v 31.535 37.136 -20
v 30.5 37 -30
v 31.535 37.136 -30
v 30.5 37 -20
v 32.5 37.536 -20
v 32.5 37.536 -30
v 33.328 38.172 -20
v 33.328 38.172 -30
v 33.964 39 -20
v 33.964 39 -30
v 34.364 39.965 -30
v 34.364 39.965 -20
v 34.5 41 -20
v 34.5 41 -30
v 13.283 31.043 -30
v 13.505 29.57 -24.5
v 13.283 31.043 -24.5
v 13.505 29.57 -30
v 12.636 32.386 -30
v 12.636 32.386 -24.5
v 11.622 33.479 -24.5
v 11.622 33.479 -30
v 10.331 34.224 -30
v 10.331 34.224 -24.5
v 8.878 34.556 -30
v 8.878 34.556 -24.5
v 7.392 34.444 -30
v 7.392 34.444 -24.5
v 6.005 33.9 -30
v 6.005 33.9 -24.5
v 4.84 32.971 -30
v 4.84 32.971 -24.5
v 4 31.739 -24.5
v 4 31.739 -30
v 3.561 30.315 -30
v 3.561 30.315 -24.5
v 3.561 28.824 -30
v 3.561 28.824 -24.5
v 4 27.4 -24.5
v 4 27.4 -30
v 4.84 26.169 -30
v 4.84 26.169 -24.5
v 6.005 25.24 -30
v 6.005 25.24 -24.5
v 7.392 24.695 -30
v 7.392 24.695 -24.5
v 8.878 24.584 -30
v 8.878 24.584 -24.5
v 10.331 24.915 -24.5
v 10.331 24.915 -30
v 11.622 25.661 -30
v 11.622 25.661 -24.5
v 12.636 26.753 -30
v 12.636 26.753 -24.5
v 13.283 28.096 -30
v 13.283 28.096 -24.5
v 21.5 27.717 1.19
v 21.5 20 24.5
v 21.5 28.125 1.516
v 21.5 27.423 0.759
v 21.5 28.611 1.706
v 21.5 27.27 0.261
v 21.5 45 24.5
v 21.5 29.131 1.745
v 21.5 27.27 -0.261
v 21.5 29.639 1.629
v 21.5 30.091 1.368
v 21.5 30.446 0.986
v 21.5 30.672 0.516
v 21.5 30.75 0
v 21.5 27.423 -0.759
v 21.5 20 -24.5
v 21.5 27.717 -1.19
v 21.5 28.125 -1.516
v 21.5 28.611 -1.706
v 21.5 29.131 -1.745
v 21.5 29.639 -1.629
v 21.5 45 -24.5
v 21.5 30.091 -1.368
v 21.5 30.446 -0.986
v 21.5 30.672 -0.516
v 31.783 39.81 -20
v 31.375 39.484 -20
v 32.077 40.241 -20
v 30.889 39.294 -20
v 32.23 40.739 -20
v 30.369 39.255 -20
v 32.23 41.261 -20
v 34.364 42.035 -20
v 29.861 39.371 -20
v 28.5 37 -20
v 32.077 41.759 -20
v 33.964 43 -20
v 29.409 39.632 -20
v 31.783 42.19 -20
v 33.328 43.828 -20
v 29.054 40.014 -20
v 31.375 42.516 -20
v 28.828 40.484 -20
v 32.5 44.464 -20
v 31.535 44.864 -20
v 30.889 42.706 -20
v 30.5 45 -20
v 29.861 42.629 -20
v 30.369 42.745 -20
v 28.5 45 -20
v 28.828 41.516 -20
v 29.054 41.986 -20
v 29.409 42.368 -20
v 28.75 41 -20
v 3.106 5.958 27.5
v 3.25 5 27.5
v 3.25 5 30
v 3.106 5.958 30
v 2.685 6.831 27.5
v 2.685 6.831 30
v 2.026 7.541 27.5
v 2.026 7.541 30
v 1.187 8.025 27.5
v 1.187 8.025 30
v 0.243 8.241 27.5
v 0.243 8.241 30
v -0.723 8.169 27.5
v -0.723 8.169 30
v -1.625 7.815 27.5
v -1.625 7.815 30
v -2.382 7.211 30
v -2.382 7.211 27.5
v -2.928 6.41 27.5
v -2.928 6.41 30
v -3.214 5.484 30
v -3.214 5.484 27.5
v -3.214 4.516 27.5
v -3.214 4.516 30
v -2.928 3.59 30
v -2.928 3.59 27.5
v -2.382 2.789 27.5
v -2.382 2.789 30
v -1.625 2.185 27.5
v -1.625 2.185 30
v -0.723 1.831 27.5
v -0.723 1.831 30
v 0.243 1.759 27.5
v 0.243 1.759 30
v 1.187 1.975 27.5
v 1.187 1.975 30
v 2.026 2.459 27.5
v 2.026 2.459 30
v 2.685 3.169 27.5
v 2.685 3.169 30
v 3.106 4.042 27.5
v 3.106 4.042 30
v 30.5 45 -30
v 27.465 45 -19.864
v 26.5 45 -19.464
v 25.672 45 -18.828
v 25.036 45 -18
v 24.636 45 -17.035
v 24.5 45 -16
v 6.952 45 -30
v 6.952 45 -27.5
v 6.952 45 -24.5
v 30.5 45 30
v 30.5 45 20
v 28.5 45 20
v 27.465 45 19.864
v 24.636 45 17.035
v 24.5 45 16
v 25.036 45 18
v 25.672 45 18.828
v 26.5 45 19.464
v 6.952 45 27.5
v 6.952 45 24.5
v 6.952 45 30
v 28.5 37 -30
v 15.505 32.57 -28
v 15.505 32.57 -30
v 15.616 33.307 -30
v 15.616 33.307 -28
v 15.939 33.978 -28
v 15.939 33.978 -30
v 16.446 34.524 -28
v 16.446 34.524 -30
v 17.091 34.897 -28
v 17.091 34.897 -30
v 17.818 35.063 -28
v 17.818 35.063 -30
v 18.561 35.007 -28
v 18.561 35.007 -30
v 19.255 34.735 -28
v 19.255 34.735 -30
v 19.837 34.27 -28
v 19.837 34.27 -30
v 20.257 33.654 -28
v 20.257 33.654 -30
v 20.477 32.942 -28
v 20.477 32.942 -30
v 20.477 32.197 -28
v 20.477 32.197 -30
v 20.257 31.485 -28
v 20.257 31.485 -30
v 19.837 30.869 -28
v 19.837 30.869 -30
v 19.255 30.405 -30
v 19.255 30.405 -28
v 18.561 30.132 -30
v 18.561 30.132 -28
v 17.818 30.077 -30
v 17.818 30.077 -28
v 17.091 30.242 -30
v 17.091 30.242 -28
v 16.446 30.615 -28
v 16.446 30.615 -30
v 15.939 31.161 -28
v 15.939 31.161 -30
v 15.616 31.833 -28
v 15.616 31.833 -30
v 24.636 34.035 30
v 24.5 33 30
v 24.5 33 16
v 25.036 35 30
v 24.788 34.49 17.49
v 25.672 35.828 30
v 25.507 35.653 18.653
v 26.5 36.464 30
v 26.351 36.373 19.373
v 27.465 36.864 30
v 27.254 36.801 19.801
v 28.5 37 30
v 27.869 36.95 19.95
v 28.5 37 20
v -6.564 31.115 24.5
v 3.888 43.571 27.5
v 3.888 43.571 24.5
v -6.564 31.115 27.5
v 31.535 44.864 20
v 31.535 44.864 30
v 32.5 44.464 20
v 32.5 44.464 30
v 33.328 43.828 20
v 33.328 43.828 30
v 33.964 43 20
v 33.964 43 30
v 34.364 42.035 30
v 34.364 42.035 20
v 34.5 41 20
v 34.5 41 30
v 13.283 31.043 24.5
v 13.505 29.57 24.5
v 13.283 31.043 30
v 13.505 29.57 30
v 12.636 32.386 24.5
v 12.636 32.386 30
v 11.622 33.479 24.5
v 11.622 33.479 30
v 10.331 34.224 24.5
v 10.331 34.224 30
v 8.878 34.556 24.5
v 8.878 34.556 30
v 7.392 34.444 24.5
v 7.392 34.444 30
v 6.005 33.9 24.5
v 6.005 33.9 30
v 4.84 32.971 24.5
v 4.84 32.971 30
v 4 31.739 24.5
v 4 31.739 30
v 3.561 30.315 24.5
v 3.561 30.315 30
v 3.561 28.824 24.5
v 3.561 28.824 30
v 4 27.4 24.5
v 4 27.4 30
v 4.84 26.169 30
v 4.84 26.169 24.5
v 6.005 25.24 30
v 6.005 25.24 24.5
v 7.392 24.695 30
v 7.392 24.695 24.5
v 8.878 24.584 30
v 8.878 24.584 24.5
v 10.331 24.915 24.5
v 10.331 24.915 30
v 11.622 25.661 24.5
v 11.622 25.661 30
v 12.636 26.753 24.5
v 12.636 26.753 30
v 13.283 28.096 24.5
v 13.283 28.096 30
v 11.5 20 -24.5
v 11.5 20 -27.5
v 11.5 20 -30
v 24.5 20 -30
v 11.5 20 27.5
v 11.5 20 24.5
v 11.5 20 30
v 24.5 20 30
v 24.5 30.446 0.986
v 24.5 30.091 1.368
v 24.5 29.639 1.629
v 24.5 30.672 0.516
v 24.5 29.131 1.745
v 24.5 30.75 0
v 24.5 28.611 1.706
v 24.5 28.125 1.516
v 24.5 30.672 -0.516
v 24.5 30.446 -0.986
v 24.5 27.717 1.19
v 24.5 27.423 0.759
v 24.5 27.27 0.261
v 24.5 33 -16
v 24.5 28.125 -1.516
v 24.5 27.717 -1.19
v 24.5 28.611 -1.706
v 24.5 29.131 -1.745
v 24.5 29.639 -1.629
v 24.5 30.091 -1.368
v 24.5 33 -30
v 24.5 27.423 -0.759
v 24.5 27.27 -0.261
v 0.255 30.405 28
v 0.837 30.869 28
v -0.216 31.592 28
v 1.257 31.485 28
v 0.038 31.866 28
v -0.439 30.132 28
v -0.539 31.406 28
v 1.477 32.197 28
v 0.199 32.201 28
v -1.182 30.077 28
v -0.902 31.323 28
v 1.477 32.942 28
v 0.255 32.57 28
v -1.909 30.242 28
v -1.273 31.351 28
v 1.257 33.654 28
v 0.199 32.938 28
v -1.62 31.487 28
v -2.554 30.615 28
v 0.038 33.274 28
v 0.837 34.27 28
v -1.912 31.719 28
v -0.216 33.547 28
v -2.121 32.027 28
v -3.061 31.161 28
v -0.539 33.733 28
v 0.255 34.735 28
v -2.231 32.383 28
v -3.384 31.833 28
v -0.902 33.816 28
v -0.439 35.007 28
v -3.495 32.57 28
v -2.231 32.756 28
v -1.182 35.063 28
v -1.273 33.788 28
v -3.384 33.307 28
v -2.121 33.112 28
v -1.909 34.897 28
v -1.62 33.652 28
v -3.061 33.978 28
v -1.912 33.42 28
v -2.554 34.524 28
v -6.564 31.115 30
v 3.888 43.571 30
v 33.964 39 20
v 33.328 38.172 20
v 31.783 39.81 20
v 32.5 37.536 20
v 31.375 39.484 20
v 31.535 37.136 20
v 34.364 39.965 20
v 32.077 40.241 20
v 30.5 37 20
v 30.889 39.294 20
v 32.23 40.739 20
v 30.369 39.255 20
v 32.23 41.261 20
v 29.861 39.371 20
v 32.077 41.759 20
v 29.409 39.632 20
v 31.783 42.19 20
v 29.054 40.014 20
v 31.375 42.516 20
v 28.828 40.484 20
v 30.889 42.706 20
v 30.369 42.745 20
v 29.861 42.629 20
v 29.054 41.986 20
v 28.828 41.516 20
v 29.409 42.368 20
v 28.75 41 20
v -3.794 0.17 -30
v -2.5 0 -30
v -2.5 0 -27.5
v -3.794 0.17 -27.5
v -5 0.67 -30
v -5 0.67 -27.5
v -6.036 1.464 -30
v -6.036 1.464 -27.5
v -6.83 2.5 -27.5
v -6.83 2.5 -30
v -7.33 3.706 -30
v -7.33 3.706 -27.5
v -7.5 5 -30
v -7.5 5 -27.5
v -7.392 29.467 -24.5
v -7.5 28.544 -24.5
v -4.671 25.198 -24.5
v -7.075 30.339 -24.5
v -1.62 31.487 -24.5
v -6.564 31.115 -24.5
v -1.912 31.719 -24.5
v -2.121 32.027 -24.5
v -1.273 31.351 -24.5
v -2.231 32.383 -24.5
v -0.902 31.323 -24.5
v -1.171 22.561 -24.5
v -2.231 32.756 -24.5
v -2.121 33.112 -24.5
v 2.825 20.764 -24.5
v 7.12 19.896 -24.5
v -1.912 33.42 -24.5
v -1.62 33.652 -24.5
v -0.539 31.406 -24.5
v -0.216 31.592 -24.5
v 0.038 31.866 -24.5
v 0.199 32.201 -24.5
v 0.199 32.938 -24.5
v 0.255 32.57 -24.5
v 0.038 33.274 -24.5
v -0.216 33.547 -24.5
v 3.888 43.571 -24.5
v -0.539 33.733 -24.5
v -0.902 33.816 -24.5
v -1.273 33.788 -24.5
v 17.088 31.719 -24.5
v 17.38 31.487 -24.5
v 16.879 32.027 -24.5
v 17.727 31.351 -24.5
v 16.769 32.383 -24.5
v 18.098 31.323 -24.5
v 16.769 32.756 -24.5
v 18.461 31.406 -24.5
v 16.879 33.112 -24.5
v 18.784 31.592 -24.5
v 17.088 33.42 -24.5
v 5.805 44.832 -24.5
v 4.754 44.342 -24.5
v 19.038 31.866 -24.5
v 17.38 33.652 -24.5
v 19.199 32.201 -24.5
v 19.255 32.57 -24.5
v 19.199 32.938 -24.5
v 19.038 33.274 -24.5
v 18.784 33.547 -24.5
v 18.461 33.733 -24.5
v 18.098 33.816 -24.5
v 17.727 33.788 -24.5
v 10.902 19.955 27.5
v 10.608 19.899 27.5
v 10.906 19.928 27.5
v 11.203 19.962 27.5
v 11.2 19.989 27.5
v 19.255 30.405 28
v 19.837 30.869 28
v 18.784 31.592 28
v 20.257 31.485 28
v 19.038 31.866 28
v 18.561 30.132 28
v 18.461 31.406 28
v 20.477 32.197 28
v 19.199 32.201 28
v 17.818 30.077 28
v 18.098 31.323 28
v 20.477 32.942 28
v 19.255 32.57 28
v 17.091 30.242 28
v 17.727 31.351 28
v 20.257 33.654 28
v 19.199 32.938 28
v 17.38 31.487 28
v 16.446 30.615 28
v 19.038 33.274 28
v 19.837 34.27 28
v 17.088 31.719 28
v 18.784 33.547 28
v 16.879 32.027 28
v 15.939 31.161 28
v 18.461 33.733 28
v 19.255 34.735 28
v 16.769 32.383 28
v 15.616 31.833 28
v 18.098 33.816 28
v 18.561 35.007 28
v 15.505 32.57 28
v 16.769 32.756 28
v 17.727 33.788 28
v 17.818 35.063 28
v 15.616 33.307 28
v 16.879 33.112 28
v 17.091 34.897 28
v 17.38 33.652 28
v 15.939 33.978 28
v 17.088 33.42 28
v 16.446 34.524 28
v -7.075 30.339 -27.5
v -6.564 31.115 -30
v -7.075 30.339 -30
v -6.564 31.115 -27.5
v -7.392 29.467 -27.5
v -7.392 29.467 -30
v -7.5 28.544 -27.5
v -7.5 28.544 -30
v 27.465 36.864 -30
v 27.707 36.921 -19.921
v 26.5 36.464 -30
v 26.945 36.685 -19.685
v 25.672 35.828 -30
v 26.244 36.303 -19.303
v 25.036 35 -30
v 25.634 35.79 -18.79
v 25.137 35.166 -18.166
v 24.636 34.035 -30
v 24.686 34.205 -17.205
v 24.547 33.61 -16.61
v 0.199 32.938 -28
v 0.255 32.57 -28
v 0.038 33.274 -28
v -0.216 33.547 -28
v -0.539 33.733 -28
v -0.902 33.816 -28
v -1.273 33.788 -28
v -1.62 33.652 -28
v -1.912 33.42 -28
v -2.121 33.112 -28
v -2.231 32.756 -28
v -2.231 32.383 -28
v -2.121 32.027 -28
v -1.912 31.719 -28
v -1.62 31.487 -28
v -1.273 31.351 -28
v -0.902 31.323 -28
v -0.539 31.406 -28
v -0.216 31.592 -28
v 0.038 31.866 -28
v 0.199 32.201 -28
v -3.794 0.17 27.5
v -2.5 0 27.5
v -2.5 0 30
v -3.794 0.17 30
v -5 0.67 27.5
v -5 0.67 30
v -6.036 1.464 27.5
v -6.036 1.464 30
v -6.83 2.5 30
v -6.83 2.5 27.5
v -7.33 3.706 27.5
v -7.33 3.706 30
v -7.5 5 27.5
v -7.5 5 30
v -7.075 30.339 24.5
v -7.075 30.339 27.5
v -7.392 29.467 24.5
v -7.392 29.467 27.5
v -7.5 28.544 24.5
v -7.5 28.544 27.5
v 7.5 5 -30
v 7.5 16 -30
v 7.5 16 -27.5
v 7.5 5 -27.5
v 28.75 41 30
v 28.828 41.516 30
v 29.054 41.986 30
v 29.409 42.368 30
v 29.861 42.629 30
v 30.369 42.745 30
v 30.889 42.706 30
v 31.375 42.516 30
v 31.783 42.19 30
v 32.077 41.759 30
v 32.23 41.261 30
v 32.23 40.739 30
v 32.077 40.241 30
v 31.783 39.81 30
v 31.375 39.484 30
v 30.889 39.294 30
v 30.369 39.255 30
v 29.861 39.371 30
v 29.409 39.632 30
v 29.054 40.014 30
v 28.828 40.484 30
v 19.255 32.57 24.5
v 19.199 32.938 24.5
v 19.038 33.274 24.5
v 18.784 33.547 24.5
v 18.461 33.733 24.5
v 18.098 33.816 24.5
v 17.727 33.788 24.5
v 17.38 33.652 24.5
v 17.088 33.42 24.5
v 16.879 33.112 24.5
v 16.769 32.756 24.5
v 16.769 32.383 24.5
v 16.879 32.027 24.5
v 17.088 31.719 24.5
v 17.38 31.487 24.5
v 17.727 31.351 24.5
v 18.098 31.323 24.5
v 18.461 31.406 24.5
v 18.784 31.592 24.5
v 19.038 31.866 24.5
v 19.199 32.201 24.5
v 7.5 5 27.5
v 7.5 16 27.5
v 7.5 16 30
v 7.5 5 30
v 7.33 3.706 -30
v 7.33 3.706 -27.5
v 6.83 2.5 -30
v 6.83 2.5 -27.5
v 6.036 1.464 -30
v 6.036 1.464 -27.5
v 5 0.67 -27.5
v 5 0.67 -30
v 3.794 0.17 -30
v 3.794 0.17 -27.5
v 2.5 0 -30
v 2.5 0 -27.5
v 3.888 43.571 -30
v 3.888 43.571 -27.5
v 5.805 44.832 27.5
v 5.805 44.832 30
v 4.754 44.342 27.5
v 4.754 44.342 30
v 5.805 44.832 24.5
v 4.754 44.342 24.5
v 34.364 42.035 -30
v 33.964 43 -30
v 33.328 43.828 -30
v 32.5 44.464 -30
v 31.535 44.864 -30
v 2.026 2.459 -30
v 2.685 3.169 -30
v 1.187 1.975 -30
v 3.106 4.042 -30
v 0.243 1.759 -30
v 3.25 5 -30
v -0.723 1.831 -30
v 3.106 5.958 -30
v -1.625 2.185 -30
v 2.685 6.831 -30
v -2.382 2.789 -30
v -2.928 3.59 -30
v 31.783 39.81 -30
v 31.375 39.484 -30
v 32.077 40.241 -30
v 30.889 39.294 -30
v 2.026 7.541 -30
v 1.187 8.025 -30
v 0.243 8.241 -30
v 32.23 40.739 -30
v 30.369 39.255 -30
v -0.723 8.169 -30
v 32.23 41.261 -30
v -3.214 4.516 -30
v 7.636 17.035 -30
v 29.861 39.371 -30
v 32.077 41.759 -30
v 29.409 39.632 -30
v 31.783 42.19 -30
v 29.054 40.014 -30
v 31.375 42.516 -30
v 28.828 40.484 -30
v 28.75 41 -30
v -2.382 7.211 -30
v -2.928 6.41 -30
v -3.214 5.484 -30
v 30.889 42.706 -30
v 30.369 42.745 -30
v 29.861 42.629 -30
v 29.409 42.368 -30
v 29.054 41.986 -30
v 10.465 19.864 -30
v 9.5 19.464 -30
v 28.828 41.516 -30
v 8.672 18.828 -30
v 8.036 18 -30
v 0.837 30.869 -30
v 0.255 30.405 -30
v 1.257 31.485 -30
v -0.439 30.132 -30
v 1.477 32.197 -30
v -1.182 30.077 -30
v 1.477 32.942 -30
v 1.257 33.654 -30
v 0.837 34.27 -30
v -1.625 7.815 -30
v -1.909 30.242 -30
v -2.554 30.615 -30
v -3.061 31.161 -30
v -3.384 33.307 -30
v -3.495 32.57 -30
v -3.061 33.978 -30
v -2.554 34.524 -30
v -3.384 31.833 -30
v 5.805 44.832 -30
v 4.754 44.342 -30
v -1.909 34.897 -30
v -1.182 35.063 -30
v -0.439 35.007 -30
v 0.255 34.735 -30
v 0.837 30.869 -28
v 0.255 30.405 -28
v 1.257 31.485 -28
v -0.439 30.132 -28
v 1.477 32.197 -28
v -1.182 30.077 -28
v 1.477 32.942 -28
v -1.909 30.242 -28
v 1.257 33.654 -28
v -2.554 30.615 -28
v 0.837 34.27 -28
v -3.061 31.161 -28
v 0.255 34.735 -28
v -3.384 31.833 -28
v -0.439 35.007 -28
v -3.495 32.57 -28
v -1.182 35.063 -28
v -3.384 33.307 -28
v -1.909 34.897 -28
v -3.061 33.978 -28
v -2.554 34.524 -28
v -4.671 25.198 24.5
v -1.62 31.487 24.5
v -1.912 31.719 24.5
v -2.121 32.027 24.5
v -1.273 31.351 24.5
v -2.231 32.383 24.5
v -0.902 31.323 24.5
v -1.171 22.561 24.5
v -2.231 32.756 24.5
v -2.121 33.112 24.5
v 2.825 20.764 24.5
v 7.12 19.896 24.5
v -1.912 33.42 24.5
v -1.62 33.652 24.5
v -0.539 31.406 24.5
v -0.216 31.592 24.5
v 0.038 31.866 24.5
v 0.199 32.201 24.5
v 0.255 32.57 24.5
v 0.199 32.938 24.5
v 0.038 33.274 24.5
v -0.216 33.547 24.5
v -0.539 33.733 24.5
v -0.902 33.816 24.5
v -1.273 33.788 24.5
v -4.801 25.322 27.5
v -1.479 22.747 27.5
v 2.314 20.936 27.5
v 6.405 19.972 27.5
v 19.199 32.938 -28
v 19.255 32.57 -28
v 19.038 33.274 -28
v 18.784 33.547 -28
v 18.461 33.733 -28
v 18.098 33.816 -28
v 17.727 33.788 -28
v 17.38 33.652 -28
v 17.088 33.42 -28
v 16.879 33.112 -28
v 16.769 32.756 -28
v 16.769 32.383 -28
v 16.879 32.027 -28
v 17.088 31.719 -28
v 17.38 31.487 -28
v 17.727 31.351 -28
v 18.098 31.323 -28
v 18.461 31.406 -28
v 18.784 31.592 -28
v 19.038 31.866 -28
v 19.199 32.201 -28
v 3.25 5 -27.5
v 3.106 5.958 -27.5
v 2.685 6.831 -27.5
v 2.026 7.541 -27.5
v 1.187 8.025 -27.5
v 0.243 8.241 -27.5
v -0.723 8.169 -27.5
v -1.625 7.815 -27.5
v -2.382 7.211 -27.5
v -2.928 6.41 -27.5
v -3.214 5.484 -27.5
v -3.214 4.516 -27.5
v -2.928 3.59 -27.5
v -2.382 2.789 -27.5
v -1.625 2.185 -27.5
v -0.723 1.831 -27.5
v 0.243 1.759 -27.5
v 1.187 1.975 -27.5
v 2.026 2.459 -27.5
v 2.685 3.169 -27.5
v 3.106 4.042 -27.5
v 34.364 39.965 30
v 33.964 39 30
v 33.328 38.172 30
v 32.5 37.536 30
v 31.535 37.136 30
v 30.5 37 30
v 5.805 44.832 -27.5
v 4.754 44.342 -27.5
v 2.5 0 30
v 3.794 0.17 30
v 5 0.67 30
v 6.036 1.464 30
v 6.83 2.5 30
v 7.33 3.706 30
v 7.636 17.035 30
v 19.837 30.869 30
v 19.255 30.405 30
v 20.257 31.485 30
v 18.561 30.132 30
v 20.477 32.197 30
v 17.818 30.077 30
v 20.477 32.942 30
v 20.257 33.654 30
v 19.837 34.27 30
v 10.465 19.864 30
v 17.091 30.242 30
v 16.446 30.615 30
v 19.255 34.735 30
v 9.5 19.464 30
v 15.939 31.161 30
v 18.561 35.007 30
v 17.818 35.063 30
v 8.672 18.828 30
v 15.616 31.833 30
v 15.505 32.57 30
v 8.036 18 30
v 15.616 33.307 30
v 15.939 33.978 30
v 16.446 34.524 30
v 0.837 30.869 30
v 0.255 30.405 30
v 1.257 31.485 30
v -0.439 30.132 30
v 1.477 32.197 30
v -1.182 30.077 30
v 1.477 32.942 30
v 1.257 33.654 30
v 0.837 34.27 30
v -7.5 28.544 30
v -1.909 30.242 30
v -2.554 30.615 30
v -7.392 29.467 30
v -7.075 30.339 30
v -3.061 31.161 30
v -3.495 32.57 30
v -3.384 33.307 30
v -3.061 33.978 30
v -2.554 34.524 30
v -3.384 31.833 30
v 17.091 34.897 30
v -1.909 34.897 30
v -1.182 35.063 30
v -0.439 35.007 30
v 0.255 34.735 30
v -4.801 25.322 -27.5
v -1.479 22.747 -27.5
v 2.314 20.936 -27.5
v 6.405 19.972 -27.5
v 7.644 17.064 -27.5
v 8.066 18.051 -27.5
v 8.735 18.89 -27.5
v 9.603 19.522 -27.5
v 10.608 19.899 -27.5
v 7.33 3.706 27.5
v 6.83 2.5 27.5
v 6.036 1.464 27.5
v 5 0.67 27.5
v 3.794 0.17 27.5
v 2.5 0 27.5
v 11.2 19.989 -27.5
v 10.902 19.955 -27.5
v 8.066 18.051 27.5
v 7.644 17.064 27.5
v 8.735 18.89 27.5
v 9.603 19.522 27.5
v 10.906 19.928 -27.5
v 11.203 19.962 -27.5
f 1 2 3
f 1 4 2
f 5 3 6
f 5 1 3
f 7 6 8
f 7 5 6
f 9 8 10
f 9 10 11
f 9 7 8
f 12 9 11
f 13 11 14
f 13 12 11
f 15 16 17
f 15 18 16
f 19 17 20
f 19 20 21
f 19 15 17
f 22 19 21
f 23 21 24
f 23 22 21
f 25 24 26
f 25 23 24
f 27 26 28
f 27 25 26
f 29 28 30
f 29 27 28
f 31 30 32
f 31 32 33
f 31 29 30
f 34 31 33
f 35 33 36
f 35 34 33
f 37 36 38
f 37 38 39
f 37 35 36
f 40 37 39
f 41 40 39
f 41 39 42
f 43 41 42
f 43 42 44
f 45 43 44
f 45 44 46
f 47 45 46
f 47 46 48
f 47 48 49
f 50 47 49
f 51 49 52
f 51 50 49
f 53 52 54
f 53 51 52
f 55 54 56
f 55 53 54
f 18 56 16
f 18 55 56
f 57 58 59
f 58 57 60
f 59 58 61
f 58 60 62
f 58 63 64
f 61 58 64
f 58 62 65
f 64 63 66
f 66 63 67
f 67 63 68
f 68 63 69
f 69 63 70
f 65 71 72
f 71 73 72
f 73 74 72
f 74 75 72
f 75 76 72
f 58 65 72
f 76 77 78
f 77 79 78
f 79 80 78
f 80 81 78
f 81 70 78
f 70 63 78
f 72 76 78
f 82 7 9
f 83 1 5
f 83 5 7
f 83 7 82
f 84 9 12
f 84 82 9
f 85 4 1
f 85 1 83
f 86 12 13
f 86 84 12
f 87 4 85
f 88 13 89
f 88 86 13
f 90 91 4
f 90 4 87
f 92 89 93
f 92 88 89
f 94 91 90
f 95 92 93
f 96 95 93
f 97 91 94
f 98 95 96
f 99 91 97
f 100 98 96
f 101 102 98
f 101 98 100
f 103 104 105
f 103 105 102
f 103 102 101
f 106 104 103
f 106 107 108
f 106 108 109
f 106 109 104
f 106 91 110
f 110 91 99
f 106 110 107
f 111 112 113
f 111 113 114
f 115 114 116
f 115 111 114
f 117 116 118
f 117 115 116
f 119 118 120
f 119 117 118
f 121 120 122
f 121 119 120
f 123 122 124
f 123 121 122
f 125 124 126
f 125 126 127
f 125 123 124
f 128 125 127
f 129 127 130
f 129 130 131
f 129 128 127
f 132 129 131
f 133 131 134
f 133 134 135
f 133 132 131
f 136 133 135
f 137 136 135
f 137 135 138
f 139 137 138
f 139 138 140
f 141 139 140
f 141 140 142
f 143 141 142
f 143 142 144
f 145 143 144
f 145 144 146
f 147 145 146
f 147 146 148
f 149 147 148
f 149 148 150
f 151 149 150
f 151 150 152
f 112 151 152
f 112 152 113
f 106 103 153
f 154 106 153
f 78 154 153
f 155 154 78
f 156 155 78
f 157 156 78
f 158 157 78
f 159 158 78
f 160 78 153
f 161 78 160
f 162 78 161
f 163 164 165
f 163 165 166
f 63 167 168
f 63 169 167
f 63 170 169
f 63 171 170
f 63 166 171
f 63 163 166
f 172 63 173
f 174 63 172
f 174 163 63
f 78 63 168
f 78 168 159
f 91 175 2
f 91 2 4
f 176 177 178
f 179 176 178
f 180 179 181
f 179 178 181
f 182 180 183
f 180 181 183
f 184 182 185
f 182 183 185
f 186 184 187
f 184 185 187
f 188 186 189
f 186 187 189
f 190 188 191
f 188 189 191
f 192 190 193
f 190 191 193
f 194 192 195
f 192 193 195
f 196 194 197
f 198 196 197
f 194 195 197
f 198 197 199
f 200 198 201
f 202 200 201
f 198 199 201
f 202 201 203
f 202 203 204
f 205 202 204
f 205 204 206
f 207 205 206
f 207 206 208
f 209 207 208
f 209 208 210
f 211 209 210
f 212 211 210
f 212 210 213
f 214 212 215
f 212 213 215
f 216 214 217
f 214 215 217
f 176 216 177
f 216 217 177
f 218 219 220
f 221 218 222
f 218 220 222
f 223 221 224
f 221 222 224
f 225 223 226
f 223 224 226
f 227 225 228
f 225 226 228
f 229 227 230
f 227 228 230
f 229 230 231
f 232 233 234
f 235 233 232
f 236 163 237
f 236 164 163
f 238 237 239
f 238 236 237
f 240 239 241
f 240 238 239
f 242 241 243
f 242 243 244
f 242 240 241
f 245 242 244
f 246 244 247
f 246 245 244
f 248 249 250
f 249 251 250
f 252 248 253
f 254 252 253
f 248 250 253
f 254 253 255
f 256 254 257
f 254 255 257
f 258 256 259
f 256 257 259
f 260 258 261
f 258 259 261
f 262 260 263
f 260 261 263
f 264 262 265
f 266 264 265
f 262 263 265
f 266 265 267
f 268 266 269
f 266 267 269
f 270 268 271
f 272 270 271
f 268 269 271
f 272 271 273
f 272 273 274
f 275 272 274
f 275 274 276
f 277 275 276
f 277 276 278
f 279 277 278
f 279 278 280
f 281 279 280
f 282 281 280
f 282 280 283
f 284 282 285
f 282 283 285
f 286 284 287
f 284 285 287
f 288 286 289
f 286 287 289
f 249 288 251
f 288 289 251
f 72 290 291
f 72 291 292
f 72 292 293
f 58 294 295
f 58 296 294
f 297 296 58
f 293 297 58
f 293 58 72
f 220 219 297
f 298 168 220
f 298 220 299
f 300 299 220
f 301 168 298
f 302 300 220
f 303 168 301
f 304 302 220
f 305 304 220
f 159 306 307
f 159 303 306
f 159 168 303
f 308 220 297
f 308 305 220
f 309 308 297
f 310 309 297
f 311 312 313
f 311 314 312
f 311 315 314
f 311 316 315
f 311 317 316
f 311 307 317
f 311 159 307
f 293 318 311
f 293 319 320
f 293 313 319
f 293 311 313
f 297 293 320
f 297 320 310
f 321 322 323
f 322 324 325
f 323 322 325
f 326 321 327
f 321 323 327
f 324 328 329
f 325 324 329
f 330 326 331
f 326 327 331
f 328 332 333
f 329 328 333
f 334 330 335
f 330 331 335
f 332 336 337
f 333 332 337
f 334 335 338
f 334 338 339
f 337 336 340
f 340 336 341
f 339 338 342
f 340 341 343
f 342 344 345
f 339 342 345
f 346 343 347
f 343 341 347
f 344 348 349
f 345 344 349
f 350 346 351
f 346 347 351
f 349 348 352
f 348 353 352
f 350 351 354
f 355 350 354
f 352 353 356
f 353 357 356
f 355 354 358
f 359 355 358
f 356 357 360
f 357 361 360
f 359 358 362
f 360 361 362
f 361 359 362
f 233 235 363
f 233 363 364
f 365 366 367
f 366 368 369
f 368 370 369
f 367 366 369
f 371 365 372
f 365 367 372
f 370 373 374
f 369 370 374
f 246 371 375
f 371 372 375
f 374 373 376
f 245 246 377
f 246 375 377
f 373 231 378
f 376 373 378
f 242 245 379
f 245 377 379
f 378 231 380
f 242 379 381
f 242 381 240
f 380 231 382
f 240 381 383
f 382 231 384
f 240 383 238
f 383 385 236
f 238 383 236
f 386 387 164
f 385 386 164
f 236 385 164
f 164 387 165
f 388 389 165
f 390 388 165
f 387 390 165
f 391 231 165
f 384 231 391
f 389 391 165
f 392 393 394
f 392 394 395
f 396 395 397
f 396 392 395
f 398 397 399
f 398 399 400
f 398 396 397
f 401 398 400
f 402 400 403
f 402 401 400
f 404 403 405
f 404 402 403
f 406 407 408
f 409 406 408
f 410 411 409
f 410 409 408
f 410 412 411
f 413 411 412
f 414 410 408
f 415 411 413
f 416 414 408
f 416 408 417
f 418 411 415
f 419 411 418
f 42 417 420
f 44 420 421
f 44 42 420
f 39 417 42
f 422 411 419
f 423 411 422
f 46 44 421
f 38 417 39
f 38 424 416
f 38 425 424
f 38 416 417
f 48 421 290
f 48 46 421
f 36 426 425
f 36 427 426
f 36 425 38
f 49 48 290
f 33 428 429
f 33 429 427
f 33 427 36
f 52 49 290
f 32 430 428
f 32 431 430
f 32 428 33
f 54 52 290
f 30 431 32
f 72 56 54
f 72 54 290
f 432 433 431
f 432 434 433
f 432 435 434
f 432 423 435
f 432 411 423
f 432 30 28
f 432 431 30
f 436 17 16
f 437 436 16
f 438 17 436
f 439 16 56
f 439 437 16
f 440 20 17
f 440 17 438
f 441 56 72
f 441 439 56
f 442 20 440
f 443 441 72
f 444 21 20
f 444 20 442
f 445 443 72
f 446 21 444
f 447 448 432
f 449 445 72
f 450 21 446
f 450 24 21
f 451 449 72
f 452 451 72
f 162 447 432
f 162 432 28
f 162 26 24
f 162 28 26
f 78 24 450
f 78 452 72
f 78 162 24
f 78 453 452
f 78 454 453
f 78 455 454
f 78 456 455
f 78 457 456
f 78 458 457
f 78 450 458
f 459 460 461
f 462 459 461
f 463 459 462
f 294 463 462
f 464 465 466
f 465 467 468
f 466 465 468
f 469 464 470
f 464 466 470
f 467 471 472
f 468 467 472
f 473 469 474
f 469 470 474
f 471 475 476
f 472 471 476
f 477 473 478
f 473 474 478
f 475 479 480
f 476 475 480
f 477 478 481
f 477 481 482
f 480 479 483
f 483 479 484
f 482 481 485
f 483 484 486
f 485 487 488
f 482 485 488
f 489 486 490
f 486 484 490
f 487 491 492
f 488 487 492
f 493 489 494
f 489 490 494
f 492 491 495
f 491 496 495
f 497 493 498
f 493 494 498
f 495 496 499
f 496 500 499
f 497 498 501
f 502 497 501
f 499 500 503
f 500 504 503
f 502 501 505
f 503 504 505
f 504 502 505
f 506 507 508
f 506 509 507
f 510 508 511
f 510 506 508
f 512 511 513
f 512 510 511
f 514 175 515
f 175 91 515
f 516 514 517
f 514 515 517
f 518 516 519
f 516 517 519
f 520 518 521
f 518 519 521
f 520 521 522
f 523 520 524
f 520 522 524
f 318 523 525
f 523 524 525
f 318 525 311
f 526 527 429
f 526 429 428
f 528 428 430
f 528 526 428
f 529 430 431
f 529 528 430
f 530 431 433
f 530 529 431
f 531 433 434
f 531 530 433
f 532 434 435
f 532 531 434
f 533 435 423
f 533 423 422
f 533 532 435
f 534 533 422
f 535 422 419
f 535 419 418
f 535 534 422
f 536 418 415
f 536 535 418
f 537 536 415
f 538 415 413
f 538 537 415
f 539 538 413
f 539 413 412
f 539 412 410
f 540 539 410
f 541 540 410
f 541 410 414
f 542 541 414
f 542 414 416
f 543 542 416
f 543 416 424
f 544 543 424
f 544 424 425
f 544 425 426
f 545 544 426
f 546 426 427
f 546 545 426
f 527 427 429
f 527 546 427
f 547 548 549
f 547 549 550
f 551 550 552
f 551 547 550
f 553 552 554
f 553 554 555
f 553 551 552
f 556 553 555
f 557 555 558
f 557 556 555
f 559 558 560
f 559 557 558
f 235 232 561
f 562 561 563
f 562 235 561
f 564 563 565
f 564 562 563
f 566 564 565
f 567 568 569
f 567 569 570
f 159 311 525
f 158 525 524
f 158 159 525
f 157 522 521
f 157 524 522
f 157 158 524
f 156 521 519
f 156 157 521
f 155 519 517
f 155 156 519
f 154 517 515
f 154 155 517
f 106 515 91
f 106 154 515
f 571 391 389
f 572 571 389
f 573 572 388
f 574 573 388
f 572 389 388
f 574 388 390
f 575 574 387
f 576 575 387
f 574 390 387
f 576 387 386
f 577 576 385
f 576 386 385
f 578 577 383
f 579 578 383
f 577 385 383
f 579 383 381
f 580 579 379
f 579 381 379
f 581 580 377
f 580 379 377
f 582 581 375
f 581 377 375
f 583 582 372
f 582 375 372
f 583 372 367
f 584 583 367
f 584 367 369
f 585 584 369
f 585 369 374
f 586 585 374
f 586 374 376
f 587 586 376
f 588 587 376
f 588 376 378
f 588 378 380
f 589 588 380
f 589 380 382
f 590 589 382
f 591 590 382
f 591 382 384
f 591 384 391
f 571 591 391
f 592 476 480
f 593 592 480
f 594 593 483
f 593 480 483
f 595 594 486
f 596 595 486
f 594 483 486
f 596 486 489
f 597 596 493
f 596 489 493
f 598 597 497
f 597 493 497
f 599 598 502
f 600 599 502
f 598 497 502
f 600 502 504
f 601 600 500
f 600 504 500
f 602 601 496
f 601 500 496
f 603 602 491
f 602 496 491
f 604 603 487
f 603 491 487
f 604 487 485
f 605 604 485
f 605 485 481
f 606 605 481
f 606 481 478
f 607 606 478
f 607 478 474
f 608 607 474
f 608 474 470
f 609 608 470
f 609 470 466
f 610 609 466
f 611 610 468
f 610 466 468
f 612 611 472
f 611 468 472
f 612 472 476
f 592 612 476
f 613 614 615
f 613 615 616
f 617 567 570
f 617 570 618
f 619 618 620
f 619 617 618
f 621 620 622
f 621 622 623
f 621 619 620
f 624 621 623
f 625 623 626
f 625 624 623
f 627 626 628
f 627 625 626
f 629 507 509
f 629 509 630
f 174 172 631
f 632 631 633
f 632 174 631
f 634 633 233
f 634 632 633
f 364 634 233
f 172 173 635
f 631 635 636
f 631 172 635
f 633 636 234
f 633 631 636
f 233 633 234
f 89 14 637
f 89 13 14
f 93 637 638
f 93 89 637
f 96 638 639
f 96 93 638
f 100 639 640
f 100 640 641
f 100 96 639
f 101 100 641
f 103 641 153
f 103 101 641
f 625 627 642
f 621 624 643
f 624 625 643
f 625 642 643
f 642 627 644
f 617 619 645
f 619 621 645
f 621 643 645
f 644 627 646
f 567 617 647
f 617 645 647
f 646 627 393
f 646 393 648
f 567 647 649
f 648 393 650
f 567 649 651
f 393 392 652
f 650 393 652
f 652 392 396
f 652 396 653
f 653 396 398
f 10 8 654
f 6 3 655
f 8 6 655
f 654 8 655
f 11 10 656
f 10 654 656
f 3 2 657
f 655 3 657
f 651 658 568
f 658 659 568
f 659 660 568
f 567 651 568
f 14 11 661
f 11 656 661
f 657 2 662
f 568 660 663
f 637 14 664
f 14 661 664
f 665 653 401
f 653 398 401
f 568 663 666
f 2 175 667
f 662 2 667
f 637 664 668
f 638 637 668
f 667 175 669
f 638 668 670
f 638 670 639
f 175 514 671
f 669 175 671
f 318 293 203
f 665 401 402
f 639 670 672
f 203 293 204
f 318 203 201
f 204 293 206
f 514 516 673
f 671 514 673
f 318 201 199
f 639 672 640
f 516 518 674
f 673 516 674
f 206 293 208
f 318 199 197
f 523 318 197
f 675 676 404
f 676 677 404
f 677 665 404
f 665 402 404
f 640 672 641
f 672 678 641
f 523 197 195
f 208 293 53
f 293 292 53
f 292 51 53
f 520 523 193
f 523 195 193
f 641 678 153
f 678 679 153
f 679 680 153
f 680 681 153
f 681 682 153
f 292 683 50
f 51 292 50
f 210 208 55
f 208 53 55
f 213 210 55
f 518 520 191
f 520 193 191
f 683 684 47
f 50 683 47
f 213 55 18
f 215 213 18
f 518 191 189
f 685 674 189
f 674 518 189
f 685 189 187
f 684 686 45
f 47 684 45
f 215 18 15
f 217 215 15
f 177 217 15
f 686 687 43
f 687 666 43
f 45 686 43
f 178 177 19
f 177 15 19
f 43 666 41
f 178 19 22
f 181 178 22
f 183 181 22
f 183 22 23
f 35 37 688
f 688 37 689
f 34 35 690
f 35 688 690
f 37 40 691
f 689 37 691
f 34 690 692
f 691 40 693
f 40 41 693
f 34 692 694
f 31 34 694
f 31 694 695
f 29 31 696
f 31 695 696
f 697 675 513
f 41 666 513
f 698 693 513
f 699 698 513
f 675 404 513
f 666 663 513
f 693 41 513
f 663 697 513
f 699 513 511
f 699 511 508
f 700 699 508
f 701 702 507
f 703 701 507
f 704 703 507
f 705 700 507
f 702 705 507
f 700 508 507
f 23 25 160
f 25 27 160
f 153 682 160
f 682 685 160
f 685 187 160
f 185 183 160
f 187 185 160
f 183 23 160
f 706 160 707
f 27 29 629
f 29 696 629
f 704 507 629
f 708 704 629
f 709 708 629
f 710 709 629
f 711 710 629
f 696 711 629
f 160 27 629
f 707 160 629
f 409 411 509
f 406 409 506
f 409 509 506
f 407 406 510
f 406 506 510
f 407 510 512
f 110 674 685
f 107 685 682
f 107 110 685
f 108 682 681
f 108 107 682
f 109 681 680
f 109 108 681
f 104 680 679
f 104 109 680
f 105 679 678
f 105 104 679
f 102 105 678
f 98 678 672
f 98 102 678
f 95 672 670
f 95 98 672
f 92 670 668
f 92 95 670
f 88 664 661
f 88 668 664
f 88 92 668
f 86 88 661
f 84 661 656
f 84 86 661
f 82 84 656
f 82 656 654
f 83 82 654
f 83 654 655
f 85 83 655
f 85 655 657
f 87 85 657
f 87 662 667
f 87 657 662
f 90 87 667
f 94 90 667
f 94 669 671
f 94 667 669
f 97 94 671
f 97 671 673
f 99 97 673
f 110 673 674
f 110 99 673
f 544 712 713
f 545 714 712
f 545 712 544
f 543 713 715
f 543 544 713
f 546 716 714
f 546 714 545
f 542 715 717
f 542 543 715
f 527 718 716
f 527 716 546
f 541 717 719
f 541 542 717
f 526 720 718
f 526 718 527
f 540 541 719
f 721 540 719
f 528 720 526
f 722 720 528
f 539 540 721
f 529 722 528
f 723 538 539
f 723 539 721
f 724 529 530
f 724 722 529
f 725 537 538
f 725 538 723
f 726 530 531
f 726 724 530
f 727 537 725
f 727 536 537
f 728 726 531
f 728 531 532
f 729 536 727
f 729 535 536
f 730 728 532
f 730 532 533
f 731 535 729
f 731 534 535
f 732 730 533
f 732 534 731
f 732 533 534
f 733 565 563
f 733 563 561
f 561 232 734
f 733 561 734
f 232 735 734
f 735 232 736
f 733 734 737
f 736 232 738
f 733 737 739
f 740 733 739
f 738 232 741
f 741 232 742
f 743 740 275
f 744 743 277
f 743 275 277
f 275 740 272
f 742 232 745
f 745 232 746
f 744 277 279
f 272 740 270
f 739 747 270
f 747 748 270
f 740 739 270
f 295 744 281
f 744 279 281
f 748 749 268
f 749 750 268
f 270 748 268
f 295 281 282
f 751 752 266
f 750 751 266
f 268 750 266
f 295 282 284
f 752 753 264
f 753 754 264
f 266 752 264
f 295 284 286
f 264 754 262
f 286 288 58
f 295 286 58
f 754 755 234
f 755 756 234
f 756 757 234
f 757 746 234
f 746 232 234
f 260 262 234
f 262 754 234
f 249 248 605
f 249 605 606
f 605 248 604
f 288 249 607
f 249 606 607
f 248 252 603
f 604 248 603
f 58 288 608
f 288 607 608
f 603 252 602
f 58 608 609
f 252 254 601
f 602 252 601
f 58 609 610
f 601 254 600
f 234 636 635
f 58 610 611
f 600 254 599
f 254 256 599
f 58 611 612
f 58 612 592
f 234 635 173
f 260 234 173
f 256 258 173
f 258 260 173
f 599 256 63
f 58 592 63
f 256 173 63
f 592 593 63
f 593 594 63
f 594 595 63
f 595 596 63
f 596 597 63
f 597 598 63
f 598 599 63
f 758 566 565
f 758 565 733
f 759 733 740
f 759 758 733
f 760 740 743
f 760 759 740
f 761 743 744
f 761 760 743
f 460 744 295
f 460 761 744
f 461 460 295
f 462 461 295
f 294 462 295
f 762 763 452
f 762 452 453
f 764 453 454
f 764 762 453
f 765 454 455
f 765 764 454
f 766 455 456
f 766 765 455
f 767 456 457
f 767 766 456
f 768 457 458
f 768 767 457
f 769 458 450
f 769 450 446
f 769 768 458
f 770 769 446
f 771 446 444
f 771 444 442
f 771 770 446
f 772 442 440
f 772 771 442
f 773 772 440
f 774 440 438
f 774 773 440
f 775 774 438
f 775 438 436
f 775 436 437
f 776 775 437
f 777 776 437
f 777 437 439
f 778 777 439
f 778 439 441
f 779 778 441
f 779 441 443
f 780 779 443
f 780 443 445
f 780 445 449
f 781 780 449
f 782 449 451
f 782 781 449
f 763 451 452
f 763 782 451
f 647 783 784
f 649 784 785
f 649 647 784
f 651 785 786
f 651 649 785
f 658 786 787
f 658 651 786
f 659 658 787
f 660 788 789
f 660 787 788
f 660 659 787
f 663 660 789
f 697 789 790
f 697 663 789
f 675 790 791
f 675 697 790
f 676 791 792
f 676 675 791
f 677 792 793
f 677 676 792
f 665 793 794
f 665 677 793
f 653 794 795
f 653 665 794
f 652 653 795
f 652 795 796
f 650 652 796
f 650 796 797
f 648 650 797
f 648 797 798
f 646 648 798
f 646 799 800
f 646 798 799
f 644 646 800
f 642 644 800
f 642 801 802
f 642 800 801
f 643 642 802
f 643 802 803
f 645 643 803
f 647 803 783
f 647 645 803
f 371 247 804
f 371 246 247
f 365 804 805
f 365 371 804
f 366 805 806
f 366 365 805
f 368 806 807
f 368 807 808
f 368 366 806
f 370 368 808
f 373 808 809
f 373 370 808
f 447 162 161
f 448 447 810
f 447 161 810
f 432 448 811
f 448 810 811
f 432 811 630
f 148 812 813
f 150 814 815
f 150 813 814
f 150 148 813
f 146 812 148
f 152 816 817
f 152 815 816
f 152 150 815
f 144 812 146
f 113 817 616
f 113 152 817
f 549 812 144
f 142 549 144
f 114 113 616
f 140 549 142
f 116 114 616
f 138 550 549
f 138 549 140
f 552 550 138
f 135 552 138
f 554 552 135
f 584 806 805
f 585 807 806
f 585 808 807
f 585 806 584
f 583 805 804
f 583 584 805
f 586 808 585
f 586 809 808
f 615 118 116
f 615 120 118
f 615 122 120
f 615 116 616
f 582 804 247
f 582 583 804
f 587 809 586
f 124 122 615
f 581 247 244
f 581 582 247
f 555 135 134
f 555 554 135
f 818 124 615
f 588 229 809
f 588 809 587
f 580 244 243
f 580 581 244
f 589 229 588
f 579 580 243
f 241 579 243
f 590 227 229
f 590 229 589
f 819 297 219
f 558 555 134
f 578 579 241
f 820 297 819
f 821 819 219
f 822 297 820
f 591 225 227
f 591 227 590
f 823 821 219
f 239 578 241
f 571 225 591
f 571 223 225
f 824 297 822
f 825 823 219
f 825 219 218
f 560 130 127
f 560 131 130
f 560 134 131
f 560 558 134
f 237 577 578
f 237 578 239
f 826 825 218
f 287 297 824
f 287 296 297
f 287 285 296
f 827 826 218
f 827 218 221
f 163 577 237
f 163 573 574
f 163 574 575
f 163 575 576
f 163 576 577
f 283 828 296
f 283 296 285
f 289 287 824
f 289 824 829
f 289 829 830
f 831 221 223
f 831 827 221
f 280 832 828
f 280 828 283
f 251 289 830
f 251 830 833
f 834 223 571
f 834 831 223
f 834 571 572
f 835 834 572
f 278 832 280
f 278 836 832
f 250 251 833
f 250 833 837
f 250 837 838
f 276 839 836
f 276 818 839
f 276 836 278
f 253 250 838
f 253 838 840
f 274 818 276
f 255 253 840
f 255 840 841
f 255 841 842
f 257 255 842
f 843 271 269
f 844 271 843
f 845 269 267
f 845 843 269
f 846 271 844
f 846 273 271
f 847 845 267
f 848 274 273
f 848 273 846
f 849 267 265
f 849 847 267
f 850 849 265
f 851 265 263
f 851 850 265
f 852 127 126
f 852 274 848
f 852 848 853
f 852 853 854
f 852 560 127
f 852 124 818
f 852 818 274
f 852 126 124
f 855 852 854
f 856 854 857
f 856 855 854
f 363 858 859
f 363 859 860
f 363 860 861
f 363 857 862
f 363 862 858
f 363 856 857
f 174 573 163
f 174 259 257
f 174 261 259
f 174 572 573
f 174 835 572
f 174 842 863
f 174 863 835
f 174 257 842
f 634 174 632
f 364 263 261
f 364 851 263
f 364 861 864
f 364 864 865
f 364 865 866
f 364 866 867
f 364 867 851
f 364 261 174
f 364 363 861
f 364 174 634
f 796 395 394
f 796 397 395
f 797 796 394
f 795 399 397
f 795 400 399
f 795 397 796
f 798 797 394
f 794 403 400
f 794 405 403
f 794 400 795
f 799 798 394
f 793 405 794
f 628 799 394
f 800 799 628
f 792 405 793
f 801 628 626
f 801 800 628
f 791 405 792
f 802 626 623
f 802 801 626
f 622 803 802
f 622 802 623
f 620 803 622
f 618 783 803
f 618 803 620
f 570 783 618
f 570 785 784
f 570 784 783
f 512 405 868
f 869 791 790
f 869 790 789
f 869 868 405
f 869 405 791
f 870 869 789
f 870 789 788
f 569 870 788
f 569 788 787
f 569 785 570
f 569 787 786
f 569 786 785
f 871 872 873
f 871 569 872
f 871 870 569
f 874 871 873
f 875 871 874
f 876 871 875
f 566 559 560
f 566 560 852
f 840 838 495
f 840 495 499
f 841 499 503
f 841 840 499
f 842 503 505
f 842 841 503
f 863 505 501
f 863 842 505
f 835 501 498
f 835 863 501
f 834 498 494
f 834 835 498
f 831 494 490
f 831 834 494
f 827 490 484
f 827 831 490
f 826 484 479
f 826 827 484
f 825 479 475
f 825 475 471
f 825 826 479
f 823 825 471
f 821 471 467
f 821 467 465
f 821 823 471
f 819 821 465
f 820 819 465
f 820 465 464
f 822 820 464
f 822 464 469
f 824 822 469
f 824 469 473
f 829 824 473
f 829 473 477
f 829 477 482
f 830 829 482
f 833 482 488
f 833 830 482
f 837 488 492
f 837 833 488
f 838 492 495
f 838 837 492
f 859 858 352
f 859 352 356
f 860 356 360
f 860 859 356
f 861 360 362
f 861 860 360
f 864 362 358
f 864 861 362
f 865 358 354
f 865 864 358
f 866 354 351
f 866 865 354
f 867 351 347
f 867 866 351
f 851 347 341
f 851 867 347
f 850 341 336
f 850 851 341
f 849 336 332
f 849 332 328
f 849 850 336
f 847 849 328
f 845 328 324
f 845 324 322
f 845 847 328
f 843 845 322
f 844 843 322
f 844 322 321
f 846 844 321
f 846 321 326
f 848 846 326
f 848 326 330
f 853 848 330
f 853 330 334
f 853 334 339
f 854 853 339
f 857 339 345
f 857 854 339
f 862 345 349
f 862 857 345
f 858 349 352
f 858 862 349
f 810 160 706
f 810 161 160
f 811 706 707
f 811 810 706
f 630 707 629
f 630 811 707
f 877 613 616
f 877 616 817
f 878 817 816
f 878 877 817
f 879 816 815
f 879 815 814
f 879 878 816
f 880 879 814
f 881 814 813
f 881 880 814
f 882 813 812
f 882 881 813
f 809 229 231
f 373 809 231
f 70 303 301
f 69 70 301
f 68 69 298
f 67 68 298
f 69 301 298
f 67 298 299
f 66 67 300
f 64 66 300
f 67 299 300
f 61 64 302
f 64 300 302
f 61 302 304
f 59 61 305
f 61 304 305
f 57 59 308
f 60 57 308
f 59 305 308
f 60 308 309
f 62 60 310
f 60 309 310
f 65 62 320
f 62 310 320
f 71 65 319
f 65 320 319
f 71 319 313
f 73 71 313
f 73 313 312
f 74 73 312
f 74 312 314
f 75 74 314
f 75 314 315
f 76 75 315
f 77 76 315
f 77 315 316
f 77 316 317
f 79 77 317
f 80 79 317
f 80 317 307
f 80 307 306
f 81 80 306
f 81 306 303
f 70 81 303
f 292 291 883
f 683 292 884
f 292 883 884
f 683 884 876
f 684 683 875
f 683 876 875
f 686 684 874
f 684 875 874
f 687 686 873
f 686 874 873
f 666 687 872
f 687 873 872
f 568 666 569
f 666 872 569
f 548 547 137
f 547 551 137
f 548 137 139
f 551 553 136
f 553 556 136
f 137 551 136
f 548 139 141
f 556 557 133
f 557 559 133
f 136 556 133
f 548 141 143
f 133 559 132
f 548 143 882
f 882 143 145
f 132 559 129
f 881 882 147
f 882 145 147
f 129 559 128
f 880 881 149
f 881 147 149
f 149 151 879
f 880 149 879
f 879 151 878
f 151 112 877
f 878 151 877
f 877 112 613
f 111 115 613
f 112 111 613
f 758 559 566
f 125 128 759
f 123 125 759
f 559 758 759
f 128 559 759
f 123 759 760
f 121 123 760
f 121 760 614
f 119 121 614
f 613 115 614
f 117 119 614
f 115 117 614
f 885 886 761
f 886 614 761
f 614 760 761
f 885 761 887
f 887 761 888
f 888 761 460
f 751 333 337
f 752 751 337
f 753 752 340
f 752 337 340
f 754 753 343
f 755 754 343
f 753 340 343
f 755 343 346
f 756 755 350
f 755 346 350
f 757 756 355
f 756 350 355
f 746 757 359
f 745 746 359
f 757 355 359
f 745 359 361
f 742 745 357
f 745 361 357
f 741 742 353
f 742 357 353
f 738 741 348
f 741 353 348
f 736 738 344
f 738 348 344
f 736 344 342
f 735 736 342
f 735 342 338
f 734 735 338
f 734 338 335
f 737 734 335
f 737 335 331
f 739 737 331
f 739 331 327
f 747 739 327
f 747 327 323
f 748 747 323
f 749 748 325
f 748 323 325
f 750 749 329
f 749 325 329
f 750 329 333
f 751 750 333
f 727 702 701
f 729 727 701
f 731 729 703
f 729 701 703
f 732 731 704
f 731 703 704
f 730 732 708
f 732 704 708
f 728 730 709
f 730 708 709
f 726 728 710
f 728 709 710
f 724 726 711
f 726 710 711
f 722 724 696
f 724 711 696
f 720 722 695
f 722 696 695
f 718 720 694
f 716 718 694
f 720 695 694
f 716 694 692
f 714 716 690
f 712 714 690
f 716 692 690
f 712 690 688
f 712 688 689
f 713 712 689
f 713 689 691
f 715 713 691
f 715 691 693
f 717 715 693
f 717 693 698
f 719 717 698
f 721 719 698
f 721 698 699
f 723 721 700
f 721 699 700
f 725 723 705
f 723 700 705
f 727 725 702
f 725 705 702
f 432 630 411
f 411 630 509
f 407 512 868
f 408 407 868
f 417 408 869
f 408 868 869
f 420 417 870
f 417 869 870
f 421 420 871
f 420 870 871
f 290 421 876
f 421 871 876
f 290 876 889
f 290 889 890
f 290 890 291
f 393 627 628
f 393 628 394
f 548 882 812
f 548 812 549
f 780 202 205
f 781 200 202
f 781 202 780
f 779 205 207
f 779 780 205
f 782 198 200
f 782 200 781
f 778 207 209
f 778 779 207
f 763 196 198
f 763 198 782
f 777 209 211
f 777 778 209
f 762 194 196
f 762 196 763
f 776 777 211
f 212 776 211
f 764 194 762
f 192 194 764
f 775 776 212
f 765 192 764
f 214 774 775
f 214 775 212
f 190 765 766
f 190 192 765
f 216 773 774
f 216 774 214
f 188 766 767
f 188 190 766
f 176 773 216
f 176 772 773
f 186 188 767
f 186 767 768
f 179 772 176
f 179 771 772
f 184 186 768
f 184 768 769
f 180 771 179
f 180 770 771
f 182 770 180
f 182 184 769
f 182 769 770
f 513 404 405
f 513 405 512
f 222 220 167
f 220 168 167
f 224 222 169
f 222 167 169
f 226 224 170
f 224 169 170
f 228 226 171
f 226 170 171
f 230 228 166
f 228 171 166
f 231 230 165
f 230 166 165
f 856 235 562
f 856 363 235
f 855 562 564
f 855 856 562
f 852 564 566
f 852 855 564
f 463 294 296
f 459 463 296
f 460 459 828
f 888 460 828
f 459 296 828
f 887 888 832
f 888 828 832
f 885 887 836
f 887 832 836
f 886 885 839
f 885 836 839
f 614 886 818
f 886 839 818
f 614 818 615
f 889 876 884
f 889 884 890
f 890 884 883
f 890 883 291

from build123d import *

# Parameters (mm, degrees)
BOSS_EXTRUDE1_DEPTH      = 30
BOSS_EXTRUDE1_DEPTH_BACK = 30
SKETCH2_R                = 3.25
SKETCH2_R_2              = 1.25
SKETCH2_R_3              = 5
SKETCH3_W                = 58
SKETCH3_H                = 55
CUT_EXTRUDE1_DEPTH       = 60.373815778
SKETCH4_W                = 10
SKETCH4_H                = 8
BOSS_EXTRUDE2_DEPTH      = 10
FILLET1_R                = 4
SKETCH5_R                = 1.75
CUT_EXTRUDE2_DEPTH       = 76.599272483
FILLET1_OF_MIRROR1_R     = 4
FILLET2_R                = 4
SKETCH6_R                = 1.25
SKETCH6_R_2              = 5
BOSS_EXTRUDE3_DEPTH      = 3
SKETCH7_R                = 2.5
CUT_EXTRUDE3_DEPTH       = 2
SKETCH8_R                = 1.75
CUT_EXTRUDE4_DEPTH       = 63.841069373


with BuildPart() as part:
    # Sketch2 → Boss-Extrude1 (new, two sides: drawn at the far end of the back side and taken through both)
    with BuildSketch(Plane.XY.offset(-BOSS_EXTRUDE1_DEPTH_BACK)):
        with BuildLine():
            Line((-7.5, 5), (-7.5, 30))
            Line((-7.5, 30), (5.086494468, 45))
            Line((5.086494468, 45), (24.5, 45))
            Line((24.5, 45), (24.5, 20))
            Line((24.5, 20), (7.5, 20))
            Line((7.5, 20), (7.5, 5))
            ThreePointArc((7.5, 5), (6.035533906, 1.464466094), (2.5, 0))
            Line((2.5, 0), (-2.5, 0))
            ThreePointArc((-2.5, 0), (-6.035533906, 1.464466094), (-7.5, 5))
        make_face()
        with Locations((0, 5)):
            Circle(SKETCH2_R, mode=Mode.SUBTRACT)
        with Locations((18.004770913, 32.569673822)):
            Circle(SKETCH2_R_2, mode=Mode.SUBTRACT)
        with Locations((-0.995229087, 32.569673822)):
            Circle(SKETCH2_R_2, mode=Mode.SUBTRACT)
        with Locations((8.504770913, 29.569673822)):
            Circle(SKETCH2_R_3, mode=Mode.SUBTRACT)
    extrude(amount=BOSS_EXTRUDE1_DEPTH + BOSS_EXTRUDE1_DEPTH_BACK)

    # Sketch3 → Cut-Extrude1 (cut, through all)
    with BuildSketch(Plane(origin=(0, 45, 0), x_dir=(1, 0, 0), z_dir=(0, 1, 0))):
        with Locations((-7.5, 0)):
            Rectangle(SKETCH3_W, SKETCH3_H)
    extrude(amount=-CUT_EXTRUDE1_DEPTH, mode=Mode.SUBTRACT)

    # Sketch4 → Boss-Extrude2 (add)
    with BuildSketch(Plane(origin=(24.5, 0, 0), x_dir=(0, 0, -1), z_dir=(1, 0, 0))):
        with Locations((-25, 41)):
            Rectangle(SKETCH4_W, SKETCH4_H)
    boss_extrude2 = extrude(amount=BOSS_EXTRUDE2_DEPTH)

    # Fillet1
    fillet1_edges = [part.edges().sort_by_distance(p)[0] for p in [
        (34.5, 37, 25),
        (34.5, 45, 25),
    ]]
    fillet(fillet1_edges, radius=FILLET1_R - 0.0001)  # a hair under: the kernel refuses the full size

    # Sketch5 → Cut-Extrude2 (cut, through all)
    with BuildSketch(Plane(origin=(0, 0, 20), x_dir=(-1, 0, 0), z_dir=(0, 0, -1))):
        with Locations((-30.5, 41)):
            Circle(SKETCH5_R)
    cut_extrude2 = extrude(amount=-CUT_EXTRUDE2_DEPTH, mode=Mode.SUBTRACT)

    # Mirror1: Boss-Extrude2, Cut-Extrude2 across plane
    add(boss_extrude2.mirror(Plane.XY))
    add(cut_extrude2.mirror(Plane.XY), mode=Mode.SUBTRACT)

    # Fillet1 of Mirror1
    fillet1_of_mirror1_edges = [part.edges().sort_by_distance(p)[0] for p in [
        (34.5, 37, -25),
        (34.5, 45, -25),
    ]]
    fillet(fillet1_of_mirror1_edges, radius=FILLET1_OF_MIRROR1_R - 0.0001)  # a hair under: the kernel refuses the full size

    # Fillet2
    fillet2_edges = [part.edges().sort_by_distance(p)[0] for p in [
        (24.5, 37, 25),
        (24.5, 41, 20),
        (24.5, 37, -25),
        (24.5, 41, -20),
        (5.086494468, 45, -28.75),
        (7.5, 20, -28.75),
        (-7.5, 30, -28.75),
        (-7.5, 30, 28.75),
        (7.5, 20, 28.75),
        (5.086494468, 45, 28.75),
    ]]
    fillet(fillet2_edges, radius=FILLET2_R)

    # Sketch6 → Boss-Extrude3 (add)
    with BuildSketch(Plane.XY.offset(-27.5)):
        with BuildLine():
            Line((21.5, 45), (6.9517251, 45))
            ThreePointArc((6.9517251, 45), (5.261252053, 44.625231148), (3.887547328, 43.571150439))
            Line((3.887547328, 43.571150439), (-6.564177772, 31.115269502))
            ThreePointArc((-6.564177772, 31.115269502), (-7.258770483, 29.912199636), (-7.5, 28.544119063))
            ThreePointArc((-7.5, 28.544119063), (0.776489044, 21.551274863), (11.5, 20))
            Line((11.5, 20), (21.5, 20))
            Line((21.5, 20), (21.5, 45))
        make_face()
        with Locations((18.004770913, 32.569673822)):
            Circle(SKETCH6_R, mode=Mode.SUBTRACT)
        with Locations((8.504770913, 29.569673822)):
            Circle(SKETCH6_R_2, mode=Mode.SUBTRACT)
        with Locations((-0.995229087, 32.569673822)):
            Circle(SKETCH6_R, mode=Mode.SUBTRACT)
    boss_extrude3 = extrude(amount=BOSS_EXTRUDE3_DEPTH)

    # Sketch7 → Cut-Extrude3 (cut)
    with BuildSketch(Plane(origin=(0, 0, -30), x_dir=(-1, 0, 0), z_dir=(0, 0, -1))):
        with Locations((-18.004770913, 32.569673822)):
            Circle(SKETCH7_R)
        with Locations((0.995229087, 32.569673822)):
            Circle(SKETCH7_R)
    cut_extrude3 = extrude(amount=-CUT_EXTRUDE3_DEPTH, mode=Mode.SUBTRACT)

    # Mirror2: Boss-Extrude3, Cut-Extrude3 across plane
    add(boss_extrude3.mirror(Plane.XY))
    add(cut_extrude3.mirror(Plane.XY), mode=Mode.SUBTRACT)

    # Sketch8 → Cut-Extrude4 (cut, through all)
    with BuildSketch(Plane(origin=(24.5, 0, 0), x_dir=(0, 0, -1), z_dir=(1, 0, 0))):
        with Locations(Location((0, 29, 0), (0, 0, 90))):
            Circle(SKETCH8_R)
    extrude(amount=-CUT_EXTRUDE4_DEPTH, mode=Mode.SUBTRACT)


solid = part.part
